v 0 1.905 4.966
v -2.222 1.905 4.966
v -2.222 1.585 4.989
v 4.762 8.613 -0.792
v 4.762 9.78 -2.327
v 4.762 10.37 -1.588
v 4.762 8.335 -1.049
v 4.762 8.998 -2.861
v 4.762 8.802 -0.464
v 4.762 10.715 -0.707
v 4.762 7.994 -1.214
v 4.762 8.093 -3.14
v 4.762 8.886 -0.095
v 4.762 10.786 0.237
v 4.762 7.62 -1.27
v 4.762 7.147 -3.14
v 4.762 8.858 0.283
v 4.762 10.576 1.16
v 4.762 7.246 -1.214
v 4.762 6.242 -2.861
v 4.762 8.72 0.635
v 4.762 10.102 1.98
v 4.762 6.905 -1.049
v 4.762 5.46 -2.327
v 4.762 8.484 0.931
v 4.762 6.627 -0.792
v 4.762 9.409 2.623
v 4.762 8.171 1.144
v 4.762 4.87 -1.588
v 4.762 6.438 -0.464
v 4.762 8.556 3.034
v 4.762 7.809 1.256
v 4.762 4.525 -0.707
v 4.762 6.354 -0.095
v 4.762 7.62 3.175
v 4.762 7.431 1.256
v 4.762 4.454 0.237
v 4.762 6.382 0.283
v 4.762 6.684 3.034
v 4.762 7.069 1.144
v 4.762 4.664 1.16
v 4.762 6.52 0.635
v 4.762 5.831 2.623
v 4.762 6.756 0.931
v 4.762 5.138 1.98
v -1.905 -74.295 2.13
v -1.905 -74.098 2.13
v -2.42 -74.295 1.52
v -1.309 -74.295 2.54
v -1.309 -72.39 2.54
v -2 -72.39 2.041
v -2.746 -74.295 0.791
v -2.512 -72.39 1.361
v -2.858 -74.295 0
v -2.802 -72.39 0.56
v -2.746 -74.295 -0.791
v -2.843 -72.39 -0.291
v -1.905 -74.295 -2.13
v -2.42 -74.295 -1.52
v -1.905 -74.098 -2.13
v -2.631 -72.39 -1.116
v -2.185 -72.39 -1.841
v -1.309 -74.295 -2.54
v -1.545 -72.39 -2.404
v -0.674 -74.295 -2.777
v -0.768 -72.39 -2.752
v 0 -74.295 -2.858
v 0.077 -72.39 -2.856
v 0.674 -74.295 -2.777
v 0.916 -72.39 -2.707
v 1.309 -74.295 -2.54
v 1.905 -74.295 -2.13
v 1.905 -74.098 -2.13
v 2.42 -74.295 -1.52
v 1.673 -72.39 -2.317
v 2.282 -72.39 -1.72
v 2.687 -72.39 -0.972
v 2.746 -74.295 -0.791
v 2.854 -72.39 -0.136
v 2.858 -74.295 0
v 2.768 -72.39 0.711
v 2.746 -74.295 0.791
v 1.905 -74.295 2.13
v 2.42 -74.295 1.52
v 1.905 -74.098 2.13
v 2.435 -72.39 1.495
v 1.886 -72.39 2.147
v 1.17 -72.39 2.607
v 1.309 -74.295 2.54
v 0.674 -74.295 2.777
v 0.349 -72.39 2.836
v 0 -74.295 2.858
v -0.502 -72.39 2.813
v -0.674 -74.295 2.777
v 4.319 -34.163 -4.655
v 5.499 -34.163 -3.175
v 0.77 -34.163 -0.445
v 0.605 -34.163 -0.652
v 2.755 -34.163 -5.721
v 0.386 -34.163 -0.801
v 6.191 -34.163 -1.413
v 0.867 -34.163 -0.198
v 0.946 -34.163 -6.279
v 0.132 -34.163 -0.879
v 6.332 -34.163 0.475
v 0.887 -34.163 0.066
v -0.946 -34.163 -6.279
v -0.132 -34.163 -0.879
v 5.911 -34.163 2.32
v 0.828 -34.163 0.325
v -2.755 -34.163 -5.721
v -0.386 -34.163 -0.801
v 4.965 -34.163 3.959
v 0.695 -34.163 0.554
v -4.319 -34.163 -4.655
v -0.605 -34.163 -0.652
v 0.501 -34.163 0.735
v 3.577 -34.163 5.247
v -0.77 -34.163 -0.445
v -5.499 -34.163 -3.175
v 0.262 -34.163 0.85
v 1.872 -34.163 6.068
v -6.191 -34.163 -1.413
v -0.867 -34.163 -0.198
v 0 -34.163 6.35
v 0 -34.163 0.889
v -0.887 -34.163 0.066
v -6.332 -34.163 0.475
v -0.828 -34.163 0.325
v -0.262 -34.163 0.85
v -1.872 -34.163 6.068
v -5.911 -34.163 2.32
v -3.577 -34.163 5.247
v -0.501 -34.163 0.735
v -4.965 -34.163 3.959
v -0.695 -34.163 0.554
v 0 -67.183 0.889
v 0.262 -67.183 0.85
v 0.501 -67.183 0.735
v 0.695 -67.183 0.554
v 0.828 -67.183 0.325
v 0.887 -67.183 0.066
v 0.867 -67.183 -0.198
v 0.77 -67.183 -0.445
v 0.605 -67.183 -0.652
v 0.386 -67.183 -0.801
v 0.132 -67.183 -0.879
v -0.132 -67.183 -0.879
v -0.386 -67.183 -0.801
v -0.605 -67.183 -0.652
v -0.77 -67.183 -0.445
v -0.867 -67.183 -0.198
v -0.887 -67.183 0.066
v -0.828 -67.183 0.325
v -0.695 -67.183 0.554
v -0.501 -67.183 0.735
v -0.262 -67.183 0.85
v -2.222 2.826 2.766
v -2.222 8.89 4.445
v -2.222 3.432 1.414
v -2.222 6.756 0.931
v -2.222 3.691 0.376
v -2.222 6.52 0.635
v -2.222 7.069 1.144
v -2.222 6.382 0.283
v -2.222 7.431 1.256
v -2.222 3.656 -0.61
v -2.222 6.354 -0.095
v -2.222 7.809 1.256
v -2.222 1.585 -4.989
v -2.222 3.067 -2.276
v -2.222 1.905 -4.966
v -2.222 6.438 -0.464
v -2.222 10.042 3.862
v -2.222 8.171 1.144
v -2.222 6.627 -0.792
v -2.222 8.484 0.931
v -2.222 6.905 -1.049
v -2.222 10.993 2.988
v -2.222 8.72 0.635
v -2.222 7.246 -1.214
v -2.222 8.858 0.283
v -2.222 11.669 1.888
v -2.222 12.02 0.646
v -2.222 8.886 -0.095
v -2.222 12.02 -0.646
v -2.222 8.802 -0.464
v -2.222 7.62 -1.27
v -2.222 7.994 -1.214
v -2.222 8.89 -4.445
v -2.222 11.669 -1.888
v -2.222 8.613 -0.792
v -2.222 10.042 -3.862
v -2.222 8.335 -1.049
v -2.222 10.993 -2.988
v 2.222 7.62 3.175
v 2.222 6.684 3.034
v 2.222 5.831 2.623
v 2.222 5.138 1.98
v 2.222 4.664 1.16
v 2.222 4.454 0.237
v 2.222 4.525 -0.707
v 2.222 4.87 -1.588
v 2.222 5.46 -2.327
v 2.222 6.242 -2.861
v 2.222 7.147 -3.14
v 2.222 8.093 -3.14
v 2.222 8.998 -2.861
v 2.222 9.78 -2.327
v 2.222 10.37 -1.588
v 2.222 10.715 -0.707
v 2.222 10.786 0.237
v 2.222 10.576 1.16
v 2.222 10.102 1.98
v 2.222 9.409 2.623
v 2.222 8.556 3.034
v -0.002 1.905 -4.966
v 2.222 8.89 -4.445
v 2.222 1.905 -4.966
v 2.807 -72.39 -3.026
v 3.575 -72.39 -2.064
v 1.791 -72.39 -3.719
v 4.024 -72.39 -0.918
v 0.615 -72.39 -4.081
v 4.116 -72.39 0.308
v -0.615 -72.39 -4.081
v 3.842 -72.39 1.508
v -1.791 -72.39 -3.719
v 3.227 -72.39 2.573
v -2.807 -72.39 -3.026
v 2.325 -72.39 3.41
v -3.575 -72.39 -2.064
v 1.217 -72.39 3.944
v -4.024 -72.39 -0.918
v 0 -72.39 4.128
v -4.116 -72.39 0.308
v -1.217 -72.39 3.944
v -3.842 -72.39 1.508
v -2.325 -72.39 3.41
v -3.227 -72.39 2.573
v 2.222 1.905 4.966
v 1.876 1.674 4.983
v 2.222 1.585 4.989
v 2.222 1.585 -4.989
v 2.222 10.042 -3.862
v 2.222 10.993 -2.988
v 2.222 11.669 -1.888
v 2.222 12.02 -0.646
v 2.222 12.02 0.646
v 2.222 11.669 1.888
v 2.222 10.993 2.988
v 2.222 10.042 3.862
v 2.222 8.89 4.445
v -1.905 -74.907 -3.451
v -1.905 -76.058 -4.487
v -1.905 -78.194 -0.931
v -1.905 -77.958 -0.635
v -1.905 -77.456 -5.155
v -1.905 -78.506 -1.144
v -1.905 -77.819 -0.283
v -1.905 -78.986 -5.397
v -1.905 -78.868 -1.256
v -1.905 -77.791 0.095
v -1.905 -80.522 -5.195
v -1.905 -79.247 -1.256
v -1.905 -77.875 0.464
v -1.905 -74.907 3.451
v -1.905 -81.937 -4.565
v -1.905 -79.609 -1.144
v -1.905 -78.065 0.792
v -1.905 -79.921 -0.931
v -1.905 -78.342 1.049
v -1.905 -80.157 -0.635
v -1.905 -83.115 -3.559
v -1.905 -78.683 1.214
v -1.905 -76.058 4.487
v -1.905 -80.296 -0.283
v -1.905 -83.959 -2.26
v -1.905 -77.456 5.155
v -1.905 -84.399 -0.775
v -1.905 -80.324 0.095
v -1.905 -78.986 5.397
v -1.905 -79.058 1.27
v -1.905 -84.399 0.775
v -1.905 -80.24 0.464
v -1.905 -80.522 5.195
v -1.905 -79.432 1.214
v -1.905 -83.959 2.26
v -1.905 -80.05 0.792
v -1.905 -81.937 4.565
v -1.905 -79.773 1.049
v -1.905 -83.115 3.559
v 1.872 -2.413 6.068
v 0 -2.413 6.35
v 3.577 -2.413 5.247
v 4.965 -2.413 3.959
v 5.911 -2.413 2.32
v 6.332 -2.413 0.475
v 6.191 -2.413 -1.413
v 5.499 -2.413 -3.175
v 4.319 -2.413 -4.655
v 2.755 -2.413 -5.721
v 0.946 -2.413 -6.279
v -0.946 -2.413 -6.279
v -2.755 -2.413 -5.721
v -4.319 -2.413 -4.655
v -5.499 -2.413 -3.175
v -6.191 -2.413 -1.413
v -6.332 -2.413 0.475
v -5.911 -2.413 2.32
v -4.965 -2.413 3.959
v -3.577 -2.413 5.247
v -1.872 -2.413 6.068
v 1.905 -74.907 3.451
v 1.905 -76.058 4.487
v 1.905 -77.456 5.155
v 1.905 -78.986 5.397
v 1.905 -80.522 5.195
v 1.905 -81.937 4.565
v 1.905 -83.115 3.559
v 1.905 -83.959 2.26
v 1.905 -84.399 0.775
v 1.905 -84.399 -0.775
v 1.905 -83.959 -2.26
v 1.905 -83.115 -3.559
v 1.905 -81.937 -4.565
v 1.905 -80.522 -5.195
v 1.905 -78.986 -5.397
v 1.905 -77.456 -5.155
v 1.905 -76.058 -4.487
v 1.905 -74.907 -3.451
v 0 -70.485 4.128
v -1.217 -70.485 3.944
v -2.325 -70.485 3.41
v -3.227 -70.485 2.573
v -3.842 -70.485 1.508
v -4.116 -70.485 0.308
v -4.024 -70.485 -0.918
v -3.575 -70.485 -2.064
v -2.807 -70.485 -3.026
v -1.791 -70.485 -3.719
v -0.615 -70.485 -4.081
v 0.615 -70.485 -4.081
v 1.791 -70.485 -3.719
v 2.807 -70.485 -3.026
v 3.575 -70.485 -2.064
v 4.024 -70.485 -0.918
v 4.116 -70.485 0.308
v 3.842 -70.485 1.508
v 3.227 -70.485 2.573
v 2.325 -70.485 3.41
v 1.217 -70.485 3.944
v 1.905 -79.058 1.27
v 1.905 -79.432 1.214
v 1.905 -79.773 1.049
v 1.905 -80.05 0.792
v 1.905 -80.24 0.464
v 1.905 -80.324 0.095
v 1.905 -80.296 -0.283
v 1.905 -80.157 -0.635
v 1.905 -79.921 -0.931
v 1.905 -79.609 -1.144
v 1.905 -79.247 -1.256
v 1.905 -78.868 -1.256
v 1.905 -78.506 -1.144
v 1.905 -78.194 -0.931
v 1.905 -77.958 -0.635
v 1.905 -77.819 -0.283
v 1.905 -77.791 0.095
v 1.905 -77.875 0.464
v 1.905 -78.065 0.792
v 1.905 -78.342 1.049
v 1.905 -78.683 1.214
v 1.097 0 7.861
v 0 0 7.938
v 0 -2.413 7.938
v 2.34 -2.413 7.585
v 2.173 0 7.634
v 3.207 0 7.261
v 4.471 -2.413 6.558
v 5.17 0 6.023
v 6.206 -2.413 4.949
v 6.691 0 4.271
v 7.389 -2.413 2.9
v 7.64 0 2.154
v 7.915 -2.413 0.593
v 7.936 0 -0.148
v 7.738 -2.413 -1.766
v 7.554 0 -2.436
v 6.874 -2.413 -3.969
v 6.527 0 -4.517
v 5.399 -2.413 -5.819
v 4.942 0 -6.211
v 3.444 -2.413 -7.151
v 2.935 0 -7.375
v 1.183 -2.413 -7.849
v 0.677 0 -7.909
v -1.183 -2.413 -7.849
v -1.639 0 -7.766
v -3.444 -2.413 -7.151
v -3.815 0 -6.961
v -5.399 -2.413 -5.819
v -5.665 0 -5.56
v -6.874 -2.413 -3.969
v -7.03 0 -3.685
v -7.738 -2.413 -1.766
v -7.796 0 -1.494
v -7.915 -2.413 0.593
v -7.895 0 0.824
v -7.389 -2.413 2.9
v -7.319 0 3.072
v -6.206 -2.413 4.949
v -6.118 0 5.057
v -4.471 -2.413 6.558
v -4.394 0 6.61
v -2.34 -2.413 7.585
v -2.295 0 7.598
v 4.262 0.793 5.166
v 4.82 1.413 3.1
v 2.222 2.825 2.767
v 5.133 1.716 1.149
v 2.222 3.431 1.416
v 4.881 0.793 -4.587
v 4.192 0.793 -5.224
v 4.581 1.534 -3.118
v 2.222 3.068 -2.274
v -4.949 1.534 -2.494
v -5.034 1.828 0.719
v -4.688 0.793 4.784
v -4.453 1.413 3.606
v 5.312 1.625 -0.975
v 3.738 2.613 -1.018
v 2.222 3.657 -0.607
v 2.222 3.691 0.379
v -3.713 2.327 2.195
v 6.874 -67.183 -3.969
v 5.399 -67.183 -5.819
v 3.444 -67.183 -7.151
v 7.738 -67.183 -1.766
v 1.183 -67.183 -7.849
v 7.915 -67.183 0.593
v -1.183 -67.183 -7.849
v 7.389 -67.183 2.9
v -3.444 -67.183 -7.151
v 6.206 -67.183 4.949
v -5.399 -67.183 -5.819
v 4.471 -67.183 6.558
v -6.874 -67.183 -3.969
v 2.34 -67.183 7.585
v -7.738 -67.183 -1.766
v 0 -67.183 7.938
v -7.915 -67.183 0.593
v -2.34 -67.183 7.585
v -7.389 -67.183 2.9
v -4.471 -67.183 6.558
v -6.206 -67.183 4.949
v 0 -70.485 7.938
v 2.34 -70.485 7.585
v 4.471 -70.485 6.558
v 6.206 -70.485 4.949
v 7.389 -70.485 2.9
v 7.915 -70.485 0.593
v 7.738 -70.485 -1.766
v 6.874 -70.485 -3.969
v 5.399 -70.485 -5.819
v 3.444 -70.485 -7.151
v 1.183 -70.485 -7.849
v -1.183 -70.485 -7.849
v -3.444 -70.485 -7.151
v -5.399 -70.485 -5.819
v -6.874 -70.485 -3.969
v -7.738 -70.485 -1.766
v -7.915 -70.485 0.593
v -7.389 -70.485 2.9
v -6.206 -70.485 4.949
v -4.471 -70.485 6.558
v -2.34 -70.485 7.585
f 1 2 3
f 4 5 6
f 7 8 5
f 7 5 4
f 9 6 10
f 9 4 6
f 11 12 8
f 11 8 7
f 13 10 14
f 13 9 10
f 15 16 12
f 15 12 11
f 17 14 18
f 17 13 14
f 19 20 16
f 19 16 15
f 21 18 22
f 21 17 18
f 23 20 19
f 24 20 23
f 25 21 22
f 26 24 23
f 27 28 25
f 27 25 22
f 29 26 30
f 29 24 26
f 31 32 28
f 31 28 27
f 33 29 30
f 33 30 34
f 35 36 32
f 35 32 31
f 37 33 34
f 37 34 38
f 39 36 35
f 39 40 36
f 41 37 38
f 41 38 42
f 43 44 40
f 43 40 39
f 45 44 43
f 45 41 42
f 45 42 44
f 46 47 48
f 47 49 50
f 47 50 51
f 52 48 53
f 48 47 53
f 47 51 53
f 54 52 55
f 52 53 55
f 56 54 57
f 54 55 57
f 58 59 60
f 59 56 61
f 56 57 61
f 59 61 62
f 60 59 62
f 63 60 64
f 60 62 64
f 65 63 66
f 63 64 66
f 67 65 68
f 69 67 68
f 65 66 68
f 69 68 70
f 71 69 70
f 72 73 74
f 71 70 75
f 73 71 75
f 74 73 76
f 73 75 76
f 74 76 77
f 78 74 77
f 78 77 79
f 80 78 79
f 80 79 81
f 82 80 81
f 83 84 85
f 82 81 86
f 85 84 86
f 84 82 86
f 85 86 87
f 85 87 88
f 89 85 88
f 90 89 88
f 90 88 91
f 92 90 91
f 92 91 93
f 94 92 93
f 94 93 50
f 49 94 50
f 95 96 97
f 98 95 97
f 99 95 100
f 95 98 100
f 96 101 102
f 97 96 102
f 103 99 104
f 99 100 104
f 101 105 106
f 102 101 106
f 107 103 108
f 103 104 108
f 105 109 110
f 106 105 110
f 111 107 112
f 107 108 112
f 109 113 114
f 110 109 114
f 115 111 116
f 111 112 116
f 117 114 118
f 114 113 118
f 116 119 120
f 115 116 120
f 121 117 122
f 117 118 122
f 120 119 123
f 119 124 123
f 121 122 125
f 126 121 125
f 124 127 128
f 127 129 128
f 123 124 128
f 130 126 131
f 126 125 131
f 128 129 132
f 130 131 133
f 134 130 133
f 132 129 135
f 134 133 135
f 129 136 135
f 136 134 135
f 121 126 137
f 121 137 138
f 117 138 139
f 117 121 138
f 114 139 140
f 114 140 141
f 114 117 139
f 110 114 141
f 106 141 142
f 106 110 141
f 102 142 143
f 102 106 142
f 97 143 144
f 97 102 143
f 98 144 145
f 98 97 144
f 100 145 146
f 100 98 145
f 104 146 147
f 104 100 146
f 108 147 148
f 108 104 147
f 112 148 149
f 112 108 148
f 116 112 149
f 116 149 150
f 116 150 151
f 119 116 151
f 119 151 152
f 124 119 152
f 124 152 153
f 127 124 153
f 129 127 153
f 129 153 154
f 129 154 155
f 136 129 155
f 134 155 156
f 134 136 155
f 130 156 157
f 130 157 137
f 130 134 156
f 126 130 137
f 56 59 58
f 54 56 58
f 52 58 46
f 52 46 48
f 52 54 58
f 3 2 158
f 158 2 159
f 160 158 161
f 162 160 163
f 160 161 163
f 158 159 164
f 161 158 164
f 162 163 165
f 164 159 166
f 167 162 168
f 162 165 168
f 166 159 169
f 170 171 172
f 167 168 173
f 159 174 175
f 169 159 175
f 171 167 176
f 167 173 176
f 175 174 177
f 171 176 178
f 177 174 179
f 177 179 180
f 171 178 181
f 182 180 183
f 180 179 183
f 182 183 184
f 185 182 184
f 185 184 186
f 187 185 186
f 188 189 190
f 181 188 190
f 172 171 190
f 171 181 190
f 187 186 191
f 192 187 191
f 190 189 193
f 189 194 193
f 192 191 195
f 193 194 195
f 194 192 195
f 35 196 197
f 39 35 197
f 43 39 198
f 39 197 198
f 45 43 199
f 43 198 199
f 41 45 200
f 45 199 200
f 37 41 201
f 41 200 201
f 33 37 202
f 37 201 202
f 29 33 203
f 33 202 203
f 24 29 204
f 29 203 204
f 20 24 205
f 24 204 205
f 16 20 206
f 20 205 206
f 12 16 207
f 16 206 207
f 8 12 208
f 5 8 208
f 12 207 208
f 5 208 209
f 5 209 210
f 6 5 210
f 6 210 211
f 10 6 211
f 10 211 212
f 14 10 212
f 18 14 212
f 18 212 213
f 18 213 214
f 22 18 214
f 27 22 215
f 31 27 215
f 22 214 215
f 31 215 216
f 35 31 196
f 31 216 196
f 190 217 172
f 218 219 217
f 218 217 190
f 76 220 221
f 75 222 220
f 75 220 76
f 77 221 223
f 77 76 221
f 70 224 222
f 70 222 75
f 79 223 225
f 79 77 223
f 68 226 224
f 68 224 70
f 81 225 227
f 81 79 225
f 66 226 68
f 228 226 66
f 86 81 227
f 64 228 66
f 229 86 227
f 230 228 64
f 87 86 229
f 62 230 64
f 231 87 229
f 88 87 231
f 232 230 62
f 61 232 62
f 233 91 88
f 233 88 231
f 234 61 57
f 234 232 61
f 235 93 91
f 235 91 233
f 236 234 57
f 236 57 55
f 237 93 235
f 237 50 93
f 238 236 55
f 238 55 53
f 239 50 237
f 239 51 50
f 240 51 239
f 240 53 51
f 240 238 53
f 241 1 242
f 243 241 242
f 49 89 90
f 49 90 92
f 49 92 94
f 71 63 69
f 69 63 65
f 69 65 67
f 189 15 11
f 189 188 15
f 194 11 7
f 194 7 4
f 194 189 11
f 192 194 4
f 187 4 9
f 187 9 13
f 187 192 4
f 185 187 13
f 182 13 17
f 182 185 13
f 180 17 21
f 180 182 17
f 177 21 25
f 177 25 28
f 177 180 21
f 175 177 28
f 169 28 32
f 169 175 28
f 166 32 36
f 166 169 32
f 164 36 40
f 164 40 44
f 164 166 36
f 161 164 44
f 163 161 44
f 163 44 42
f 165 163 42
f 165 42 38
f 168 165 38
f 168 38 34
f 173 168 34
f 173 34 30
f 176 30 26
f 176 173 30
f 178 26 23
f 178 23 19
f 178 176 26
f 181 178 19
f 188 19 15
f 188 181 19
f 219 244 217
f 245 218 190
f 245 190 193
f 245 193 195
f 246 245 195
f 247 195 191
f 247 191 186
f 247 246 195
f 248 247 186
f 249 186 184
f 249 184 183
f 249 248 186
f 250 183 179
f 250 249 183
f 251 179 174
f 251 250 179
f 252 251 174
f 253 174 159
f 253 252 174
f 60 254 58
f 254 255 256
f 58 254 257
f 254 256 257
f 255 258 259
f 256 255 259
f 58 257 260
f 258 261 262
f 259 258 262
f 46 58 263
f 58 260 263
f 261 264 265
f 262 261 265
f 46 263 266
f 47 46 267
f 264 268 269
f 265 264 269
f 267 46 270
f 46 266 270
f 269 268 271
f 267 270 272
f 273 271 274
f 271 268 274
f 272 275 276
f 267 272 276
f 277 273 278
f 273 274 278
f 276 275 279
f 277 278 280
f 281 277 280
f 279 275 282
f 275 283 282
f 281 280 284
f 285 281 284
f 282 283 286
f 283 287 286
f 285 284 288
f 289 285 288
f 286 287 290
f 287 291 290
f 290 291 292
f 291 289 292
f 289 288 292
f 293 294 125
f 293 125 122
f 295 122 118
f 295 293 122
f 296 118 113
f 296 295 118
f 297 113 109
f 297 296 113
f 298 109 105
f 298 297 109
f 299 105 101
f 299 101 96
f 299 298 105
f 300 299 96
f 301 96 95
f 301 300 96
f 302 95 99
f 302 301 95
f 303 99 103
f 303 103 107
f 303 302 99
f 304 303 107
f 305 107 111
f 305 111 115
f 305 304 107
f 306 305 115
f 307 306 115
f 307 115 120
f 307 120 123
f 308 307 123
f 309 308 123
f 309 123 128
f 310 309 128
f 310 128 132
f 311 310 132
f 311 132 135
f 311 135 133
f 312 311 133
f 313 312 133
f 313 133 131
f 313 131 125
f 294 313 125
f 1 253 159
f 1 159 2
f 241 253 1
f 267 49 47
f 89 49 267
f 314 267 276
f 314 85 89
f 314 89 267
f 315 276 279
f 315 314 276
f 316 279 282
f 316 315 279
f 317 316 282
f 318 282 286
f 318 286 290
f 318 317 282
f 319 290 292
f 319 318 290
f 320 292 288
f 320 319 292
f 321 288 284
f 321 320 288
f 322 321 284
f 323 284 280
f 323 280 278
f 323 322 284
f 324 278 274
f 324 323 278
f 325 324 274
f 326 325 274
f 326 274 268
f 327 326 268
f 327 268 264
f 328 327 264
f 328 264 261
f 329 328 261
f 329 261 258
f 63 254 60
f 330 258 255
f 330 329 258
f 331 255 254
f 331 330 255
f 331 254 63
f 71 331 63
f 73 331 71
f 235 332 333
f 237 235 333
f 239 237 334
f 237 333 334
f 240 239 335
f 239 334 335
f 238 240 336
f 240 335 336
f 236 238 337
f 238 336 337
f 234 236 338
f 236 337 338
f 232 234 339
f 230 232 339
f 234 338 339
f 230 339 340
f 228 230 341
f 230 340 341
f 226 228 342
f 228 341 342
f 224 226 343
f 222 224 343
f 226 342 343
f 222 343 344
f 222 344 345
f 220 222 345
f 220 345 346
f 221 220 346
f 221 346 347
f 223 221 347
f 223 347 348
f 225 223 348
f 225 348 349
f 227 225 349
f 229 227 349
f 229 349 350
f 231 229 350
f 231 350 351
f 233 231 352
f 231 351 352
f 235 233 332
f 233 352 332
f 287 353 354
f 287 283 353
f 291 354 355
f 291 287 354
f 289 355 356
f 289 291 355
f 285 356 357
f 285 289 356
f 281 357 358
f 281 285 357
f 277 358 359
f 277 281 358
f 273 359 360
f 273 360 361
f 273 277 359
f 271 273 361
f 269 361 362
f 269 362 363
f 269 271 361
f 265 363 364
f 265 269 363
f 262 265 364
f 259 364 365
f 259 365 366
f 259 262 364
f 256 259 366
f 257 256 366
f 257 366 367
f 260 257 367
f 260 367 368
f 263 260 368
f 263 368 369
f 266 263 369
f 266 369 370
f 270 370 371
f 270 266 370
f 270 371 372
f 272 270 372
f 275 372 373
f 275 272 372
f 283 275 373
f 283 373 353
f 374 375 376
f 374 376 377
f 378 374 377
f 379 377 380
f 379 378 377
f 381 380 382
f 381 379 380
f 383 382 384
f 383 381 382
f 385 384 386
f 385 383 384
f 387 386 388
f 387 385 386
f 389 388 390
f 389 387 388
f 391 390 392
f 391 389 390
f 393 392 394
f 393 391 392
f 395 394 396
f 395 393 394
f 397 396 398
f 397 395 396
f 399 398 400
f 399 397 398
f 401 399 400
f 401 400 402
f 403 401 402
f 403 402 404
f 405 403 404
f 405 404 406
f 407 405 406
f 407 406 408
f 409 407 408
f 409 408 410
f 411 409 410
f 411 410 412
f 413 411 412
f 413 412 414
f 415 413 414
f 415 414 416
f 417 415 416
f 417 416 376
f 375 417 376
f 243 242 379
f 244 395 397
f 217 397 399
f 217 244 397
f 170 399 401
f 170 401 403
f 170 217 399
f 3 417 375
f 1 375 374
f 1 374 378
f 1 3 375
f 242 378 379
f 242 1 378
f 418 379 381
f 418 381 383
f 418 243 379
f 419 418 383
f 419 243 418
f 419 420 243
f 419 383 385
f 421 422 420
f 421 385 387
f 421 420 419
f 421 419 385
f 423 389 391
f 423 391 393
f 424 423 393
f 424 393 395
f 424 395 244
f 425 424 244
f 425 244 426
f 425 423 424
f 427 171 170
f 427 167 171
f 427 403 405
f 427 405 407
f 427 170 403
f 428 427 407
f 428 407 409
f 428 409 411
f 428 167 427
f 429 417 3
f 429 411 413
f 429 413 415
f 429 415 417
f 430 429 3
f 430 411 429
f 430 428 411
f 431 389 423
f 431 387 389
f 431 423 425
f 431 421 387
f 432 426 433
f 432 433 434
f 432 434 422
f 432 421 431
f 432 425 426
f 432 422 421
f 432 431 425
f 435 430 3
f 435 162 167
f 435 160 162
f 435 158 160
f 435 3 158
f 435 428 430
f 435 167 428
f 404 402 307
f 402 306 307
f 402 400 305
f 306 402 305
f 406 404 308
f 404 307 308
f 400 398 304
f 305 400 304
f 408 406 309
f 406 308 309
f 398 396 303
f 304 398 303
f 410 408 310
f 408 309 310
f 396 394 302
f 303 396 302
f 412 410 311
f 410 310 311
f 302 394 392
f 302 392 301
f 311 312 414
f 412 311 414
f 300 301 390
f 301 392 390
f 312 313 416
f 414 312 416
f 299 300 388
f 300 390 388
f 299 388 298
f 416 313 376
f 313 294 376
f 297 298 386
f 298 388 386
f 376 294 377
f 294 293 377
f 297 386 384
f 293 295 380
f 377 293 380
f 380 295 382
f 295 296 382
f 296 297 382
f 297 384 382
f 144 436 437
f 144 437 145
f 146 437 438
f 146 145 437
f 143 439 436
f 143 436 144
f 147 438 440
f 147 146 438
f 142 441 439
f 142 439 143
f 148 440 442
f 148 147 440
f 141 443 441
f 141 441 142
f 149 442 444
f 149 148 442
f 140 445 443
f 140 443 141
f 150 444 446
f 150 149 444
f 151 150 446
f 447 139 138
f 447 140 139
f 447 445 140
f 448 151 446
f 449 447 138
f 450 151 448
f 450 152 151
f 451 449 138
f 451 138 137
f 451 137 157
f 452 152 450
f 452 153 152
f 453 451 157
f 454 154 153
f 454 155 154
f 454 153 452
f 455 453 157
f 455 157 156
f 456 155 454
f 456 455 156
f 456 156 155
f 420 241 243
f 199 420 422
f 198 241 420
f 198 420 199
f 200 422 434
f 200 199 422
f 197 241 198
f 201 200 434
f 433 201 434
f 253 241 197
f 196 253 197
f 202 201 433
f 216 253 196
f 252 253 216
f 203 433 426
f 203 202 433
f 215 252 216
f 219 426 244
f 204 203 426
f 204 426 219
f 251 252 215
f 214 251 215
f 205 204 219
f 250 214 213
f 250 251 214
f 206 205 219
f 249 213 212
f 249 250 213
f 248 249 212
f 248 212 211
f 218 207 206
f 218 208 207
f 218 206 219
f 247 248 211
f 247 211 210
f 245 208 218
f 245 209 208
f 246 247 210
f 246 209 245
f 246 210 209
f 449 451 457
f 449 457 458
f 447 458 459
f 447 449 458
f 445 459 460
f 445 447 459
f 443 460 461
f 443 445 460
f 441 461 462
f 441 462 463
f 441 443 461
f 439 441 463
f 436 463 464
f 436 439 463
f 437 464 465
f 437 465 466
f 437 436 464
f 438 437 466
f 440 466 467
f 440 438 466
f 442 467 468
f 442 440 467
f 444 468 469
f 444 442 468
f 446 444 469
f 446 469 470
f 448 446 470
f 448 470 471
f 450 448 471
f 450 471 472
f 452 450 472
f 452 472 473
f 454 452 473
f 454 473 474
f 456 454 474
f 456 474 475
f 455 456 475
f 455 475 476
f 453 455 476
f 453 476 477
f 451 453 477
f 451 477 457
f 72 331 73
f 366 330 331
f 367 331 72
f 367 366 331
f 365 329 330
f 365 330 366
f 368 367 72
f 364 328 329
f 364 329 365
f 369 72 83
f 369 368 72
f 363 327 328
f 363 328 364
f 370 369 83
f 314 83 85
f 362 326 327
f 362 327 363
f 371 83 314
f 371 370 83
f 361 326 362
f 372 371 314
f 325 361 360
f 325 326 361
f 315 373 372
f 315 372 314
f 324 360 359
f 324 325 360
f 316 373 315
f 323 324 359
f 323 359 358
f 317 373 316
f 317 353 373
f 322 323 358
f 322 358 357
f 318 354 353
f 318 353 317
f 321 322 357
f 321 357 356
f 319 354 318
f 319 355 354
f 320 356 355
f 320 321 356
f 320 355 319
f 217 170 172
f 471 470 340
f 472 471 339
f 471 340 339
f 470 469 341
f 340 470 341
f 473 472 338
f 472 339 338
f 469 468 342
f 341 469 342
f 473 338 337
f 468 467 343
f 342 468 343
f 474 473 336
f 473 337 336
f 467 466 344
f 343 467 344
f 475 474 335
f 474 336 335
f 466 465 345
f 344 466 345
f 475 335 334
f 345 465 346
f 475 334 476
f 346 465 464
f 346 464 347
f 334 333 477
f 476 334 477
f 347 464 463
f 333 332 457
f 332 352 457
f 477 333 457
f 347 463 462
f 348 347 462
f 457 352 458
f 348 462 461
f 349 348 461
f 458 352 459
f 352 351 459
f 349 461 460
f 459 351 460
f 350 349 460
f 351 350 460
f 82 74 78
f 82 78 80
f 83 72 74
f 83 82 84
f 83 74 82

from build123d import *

# Parameters (mm, degrees)
SKETCH1_R      = 7.9375
EXTRUDE1_DEPTH = 70.485
SKETCH4_R      = 1.27
EXTRUDE2_DEPTH = 2.2225
SKETCH5_R      = 5.3975
SKETCH5_R_2    = 1.27
EXTRUDE3_DEPTH = 1.905
SKETCH6_R      = 4.1275
EXTRUDE4_DEPTH = 1.905
SKETCH7_R      = 2.8575
EXTRUDE5_DEPTH = 1.905
SKETCH8_R      = 3.175
SKETCH8_R_2    = 1.27
EXTRUDE6_DEPTH = 2.54
SKETCH9_R      = 7.9375
SKETCH9_R_2    = 6.35
EXTRUDE7_DEPTH = 33.02
SKETCH10_R     = 8.451029387
SKETCH10_R_2   = 0.889
EXTRUDE8_DEPTH = 33.02


with BuildPart() as part:
    # Sketch1 → Extrude1 (new body)
    with BuildSketch(Plane(origin=(0, 0, 0), x_dir=(1, 0, 0), z_dir=(0, 1, 0))):
        with Locations(Location((0, 0, 0), (0, 0, 270))):
            Circle(SKETCH1_R)
    extrude(amount=-EXTRUDE1_DEPTH)

    # Loft1: read off the stored shape, not the designer's step
    # Loft1: loft between two sections, ruled curve by curve
    loft1_from = [
        Edge.make_bspline([(3.207196431, 0, 7.26070226), (17.72860095, 0, 0.846309398), (11.314208088, 0, -13.675095122), (-3.207196431, 0, -7.26070226), (-17.72860095, 0, -0.846309398), (-11.314208088, 0, 13.675095122), (3.207196431, 0, 7.26070226)], [0, 0, 0, 0, 0.5, 0.5, 0.5, 1, 1, 1, 1], 3, [1, 0.333333333, 0.333333333, 1, 0.333333333, 0.333333333, 1]),
    ]
    loft1_to = [
        Edge.make_bspline([(0.075387957, 3.937, 1.903507724), (3.882403406, 3.937, 1.75273181), (3.731627491, 3.937, -2.054283639), (-0.075387957, 3.937, -1.903507724), (-3.882403406, 3.937, -1.75273181), (-3.731627491, 3.937, 2.054283639), (0.075387957, 3.937, 1.903507724)], [0, 0, 0, 0, 0.5, 0.5, 0.5, 1, 1, 1, 1], 3, [1, 0.333333333, 0.333333333, 1, 0.333333333, 0.333333333, 1]),
    ]
    loft1 = Solid(Shell([*[Face.make_surface_from_curves(loft1_from[k], loft1_to[k]) for k in range(1)], Face(Wire(loft1_from)), Face(Wire(loft1_to))]))
    add(loft1)

    # Sketch4 → Extrude2 (add, symmetric)
    with BuildSketch(Plane(origin=(0, 0, 0), x_dir=(0, 0, -1), z_dir=(1, 0, 0))):
        with BuildLine():
            Line((4.965601833, 1.905), (4.445, 8.89))
            ThreePointArc((4.445, 8.89), (0, 12.065), (-4.445, 8.89))
            Line((-4.445, 8.89), (-4.965601949, 1.905))
            Line((-4.965601949, 1.905), (-5.107584298, 0))
            Line((-5.107584298, 0), (5.107584151, 0))
            Line((5.107584151, 0), (4.965601833, 1.905))
        make_face()
        with Locations((0, 7.62)):
            Circle(SKETCH4_R, mode=Mode.SUBTRACT)
    extrude(amount=EXTRUDE2_DEPTH, both=True)

    # Sketch6 → Extrude4 (add)
    with BuildSketch(Plane.XZ.offset(70.485)):
        with Locations(Location((0, 0, 0), (0, 0, 90))):
            Circle(SKETCH6_R)
    extrude(amount=EXTRUDE4_DEPTH)



with BuildPart() as body_2:
    # Sketch5 → Extrude3 (new, symmetric)
    with BuildSketch(Plane(origin=(0, 0, 0), x_dir=(0, 0, -1), z_dir=(1, 0, 0))):
        with Locations(Location((0, -79.0575, 0), (0, 0, 180))):
            Circle(SKETCH5_R)
        with Locations(Location((0, -79.0575, 0), (0, 0, 180))):
            Circle(SKETCH5_R_2, mode=Mode.SUBTRACT)
    extrude(amount=EXTRUDE3_DEPTH, both=True)


with BuildPart() as part_1:
    add(part.part)

    add(body_2.part)  # Extrude5 merges body 2
    # Sketch7 → Extrude5 (add)
    with BuildSketch(Plane.XZ.offset(72.39)):
        with Locations(Location((0, 0, 0), (0, 0, 117.266044451))):
            Circle(SKETCH7_R)
    extrude(amount=EXTRUDE5_DEPTH)

    # Sketch8 → Extrude6 (add)
    with BuildSketch(Plane(origin=(2.2225, 0, 0), x_dir=(0, 0, -1), z_dir=(1, 0, 0))):
        with Locations(Location((0, 7.62, 0), (0, 0, 180))):
            Circle(SKETCH8_R)
        with Locations((0, 7.62)):
            Circle(SKETCH8_R_2, mode=Mode.SUBTRACT)
    extrude(amount=EXTRUDE6_DEPTH)

    # Sketch9 → Extrude7 (cut)
    with BuildSketch(Plane(origin=(0, -2.413, 0), x_dir=(-1, 0, 0), z_dir=(0, 1, 0))):
        with Locations(Location((0, 0, 0), (0, 0, 90))):
            Circle(SKETCH9_R)
        with Locations(Location((0, 0, 0), (0, 0, 90))):
            Circle(SKETCH9_R_2, mode=Mode.SUBTRACT)
    extrude(amount=-EXTRUDE7_DEPTH, mode=Mode.SUBTRACT)

    # Sketch10 → Extrude8 (cut)
    with BuildSketch(Plane(origin=(0, -34.163, 0), x_dir=(-1, 0, 0), z_dir=(0, 1, 0))):
        Circle(SKETCH10_R)
        with Locations(Location((0, 0, 0), (0, 0, 90))):
            Circle(SKETCH10_R_2, mode=Mode.SUBTRACT)
    extrude(amount=-EXTRUDE8_DEPTH, mode=Mode.SUBTRACT)


solid = part_1.part
